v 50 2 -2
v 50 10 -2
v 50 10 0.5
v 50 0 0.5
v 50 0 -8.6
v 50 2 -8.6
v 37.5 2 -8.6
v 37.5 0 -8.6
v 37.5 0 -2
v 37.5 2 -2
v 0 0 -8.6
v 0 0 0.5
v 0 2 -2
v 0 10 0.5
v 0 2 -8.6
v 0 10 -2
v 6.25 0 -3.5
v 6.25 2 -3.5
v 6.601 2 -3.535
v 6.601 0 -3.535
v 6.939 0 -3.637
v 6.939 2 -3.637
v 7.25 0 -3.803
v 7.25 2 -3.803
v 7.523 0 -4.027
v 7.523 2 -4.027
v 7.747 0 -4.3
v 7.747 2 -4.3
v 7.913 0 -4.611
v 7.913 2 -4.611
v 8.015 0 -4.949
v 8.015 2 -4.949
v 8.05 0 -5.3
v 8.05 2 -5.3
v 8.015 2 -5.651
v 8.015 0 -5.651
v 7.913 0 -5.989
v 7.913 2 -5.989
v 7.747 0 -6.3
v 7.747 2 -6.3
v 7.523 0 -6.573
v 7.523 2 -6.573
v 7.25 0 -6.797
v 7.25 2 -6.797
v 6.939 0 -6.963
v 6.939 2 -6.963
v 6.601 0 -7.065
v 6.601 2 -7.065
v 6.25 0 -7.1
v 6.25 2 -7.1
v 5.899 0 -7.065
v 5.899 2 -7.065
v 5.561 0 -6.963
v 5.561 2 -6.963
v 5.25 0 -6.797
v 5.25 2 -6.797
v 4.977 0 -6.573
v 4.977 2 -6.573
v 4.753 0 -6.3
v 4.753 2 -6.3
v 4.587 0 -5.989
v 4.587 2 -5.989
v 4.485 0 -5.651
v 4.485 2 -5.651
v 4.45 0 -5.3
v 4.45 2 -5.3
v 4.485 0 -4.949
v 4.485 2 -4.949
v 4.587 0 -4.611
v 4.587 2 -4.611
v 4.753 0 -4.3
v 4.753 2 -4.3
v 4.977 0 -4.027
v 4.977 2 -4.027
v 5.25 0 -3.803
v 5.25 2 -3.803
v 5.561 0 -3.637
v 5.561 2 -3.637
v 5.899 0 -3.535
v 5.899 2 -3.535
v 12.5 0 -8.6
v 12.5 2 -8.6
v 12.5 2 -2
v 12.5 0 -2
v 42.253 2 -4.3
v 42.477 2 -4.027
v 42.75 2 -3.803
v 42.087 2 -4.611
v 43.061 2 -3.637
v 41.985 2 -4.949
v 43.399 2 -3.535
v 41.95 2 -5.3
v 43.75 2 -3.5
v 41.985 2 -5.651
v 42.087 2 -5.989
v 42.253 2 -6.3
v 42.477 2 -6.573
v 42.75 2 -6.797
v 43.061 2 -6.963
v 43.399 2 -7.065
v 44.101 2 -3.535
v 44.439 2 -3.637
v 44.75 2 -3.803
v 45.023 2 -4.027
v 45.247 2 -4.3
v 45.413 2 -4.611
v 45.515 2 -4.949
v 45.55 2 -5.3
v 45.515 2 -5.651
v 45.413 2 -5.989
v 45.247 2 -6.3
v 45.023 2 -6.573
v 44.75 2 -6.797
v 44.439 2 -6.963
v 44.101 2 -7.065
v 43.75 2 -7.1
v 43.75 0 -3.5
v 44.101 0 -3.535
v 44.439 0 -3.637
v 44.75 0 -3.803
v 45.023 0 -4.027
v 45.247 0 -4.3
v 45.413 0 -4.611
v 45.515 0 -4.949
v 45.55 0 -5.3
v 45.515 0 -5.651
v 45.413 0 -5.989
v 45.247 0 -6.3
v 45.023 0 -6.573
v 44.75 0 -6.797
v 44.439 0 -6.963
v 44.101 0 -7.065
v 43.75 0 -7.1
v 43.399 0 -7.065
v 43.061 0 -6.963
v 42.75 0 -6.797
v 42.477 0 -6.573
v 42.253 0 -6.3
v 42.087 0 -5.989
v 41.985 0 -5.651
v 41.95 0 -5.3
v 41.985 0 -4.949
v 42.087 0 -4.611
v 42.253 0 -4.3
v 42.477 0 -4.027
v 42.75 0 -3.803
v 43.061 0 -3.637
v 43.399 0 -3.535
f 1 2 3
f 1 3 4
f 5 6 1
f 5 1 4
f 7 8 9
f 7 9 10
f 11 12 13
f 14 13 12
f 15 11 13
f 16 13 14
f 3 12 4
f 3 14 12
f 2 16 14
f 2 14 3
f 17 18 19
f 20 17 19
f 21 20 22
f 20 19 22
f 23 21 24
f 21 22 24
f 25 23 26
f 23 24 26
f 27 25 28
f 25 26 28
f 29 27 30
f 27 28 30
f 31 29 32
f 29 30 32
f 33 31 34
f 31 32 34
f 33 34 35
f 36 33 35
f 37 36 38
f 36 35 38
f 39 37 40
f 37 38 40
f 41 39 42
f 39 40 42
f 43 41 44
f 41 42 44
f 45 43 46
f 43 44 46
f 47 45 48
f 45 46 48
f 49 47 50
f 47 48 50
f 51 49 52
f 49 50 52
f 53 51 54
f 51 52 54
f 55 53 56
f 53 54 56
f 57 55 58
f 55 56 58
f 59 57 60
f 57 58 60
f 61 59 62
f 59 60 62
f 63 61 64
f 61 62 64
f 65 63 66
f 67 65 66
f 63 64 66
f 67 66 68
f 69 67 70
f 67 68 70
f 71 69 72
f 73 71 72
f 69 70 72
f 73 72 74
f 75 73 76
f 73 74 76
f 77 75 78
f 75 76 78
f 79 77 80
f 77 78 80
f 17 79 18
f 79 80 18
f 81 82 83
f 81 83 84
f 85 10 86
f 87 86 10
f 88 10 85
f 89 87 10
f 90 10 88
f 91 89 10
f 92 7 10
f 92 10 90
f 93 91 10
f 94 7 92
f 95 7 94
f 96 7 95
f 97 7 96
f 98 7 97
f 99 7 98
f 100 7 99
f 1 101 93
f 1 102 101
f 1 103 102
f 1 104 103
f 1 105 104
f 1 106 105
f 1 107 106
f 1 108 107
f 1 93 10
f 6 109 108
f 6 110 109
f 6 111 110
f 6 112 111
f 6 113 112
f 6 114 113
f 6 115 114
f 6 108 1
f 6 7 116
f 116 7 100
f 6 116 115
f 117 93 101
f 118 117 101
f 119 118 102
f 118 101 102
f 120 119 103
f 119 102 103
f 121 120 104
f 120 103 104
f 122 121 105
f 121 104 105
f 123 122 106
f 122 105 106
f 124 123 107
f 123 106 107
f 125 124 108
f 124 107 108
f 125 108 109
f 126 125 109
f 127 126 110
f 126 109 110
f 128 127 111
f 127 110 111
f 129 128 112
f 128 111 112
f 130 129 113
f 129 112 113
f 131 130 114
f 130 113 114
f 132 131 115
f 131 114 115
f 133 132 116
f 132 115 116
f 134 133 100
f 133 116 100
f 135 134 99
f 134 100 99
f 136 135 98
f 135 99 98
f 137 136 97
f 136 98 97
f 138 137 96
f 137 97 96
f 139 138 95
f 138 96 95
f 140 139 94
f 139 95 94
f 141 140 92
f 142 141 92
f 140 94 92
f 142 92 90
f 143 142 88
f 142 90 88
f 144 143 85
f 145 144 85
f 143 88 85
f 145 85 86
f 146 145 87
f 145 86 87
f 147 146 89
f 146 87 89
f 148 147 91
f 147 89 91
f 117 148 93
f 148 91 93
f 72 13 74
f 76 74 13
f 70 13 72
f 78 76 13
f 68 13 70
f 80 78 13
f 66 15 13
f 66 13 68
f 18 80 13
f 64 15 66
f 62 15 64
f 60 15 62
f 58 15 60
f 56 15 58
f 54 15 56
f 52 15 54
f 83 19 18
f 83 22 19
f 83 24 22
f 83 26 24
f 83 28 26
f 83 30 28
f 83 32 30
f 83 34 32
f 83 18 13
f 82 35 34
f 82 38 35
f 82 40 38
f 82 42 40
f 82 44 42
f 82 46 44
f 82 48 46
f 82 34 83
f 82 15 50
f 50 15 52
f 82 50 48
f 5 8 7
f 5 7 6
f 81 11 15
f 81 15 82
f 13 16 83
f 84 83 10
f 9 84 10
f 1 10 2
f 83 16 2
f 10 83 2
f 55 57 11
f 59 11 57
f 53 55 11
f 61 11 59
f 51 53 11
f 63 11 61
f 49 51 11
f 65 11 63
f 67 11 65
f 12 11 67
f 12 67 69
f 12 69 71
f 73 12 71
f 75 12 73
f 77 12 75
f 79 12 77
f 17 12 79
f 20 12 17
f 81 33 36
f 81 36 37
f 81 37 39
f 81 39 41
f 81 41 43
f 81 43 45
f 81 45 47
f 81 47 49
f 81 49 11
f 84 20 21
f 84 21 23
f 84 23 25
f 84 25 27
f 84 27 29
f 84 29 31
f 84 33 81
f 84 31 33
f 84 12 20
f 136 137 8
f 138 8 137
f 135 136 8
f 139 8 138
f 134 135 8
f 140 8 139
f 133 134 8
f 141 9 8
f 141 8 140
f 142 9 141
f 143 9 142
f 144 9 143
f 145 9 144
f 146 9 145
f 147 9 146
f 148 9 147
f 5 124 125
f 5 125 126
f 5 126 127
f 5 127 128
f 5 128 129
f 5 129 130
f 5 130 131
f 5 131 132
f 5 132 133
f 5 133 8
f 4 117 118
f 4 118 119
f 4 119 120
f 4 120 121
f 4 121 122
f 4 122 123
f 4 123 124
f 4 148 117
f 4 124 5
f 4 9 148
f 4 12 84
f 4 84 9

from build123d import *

# Parameters (mm, degrees)
SKETCH1_W           = 50
SKETCH1_H           = 8.6
BOSS_EXTRUDE2_DEPTH = 2
SKETCH3_W           = 50
SKETCH3_H           = 2
BOSS_EXTRUDE3_DEPTH = 8
SKETCH4_W           = 25
SKETCH4_H           = 6.6
CUT_EXTRUDE1_DEPTH  = 8
SKETCH5_W           = 25
SKETCH5_H           = 2
CUT_EXTRUDE2_DEPTH  = 2
SKETCH6_R           = 1.8
CUT_EXTRUDE3_DEPTH  = 2
BOSS_EXTRUDE4_DEPTH = 0.5
SKETCH8_W           = 25
SKETCH8_H           = 2
BOSS_EXTRUDE5_DEPTH = 2.5


with BuildPart() as part:
    # Sketch1 → Boss-Extrude2 (new body)
    with BuildSketch(Plane(origin=(0, 0, 0), x_dir=(1, 0, 0), z_dir=(0, 1, 0))):
        with Locations((25, 4.3)):
            Rectangle(SKETCH1_W, SKETCH1_H)
    extrude(amount=BOSS_EXTRUDE2_DEPTH)

    # Sketch3 → Boss-Extrude3 (add)
    with BuildSketch(Plane(origin=(0, 2, 0), x_dir=(1, 0, 0), z_dir=(0, 1, 0))):
        with Locations((25, 1)):
            Rectangle(SKETCH3_W, SKETCH3_H)
    extrude(amount=BOSS_EXTRUDE3_DEPTH)

    # Sketch4 → Cut-Extrude1 (cut)
    with BuildSketch(Plane(origin=(0, 2, 0), x_dir=(1, 0, 0), z_dir=(0, 1, 0))):
        with Locations((25, 5.3)):
            Rectangle(SKETCH4_W, SKETCH4_H)
    extrude(amount=-CUT_EXTRUDE1_DEPTH, mode=Mode.SUBTRACT)

    # Sketch5 → Cut-Extrude2 (cut)
    with BuildSketch(Plane(origin=(0, 0, -2), x_dir=(-1, 0, 0), z_dir=(0, 0, -1))):
        with Locations((-25, 1)):
            Rectangle(SKETCH5_W, SKETCH5_H)
    extrude(amount=-CUT_EXTRUDE2_DEPTH, mode=Mode.SUBTRACT)

    # Sketch6 → Cut-Extrude3 (cut)
    with BuildSketch(Plane(origin=(0, 2, 0), x_dir=(1, 0, 0), z_dir=(0, 1, 0))):
        with Locations(Location((43.75, 5.3, 0), (0, 0, 270))):
            Circle(SKETCH6_R)
        with Locations(Location((6.25, 5.3, 0), (0, 0, 270))):
            Circle(SKETCH6_R)
    extrude(amount=-CUT_EXTRUDE3_DEPTH, mode=Mode.SUBTRACT)

    # Sketch7 → Boss-Extrude4 (add)
    with BuildSketch(Plane.XY):
        Polygon((12.5, 0), (0, 0), (0, 10), (50, 10), (50, 0), (37.5, 0), (37.5, 2), (12.5, 2), align=None)
    extrude(amount=BOSS_EXTRUDE4_DEPTH)

    # Sketch8 → Boss-Extrude5 (add)
    with BuildSketch(Plane.XY.offset(0.5)):
        with Locations((25, 1)):
            Rectangle(SKETCH8_W, SKETCH8_H)
    extrude(amount=-BOSS_EXTRUDE5_DEPTH)


solid = part.part
